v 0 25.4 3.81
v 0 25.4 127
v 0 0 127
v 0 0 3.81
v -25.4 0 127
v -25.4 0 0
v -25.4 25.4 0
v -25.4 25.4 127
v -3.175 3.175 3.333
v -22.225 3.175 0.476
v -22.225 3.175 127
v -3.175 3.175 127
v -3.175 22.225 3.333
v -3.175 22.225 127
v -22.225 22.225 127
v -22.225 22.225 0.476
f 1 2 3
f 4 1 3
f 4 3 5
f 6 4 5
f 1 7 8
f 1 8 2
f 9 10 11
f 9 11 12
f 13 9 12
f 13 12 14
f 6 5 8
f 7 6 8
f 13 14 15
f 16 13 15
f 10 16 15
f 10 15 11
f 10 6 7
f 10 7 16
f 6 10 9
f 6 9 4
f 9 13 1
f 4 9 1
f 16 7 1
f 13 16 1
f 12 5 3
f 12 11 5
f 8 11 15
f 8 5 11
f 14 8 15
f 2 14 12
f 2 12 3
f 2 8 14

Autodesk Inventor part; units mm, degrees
ref_plane "YZ Plane" through (0, 0, 0) normal (1, 0, 0) x (0, 1, 0)
ref_plane "XZ Plane" through (0, 0, 0) normal (0, 1, 0) x (-1, 0, 0)
ref_plane "XY Plane" through (0, 0, 0) normal (0, 0, 1) x (1, 0, 0)
sketch "Sketch1" plane through (0, 0, 0) normal (0, 0, 1) x (1, 0, 0)
  line L0 (0, 0) -> (-25.4, 0)
  line L1 (-25.4, 0) -> (-25.4, 25.4)
  line L2 (-25.4, 25.4) -> (0, 25.4)
  line L3 (0, 25.4) -> (0, 0)
  line L4 (-3.175, 22.225) -> (-22.225, 22.225)
  line L5 (-22.225, 22.225) -> (-22.225, 3.175)
  line L6 (-22.225, 3.175) -> (-3.175, 3.175)
  line L7 (-3.175, 3.175) -> (-3.175, 22.225)
  dimension "d0" = 25.4
  dimension "d1" = 25.4
  dimension "d2" = 3.175
extrude "Extrusion1" add sketch "Sketch1" along normal blind 127
sketch "Sketch2" plane through (-25.4, 25.4, 0) normal (0, 1, 0) x (1, 0, 0)
  line L0 (0, 0) -> (25.4, 0) projected
  line L1 (25.4, 0) -> (25.4, -127) projected
  line L2 (0, 0) -> (25.4, -3.8097)
  dimension "d5" = 8.53
extrude "Extrusion2" cut sketch "Sketch2" against normal blind 127
